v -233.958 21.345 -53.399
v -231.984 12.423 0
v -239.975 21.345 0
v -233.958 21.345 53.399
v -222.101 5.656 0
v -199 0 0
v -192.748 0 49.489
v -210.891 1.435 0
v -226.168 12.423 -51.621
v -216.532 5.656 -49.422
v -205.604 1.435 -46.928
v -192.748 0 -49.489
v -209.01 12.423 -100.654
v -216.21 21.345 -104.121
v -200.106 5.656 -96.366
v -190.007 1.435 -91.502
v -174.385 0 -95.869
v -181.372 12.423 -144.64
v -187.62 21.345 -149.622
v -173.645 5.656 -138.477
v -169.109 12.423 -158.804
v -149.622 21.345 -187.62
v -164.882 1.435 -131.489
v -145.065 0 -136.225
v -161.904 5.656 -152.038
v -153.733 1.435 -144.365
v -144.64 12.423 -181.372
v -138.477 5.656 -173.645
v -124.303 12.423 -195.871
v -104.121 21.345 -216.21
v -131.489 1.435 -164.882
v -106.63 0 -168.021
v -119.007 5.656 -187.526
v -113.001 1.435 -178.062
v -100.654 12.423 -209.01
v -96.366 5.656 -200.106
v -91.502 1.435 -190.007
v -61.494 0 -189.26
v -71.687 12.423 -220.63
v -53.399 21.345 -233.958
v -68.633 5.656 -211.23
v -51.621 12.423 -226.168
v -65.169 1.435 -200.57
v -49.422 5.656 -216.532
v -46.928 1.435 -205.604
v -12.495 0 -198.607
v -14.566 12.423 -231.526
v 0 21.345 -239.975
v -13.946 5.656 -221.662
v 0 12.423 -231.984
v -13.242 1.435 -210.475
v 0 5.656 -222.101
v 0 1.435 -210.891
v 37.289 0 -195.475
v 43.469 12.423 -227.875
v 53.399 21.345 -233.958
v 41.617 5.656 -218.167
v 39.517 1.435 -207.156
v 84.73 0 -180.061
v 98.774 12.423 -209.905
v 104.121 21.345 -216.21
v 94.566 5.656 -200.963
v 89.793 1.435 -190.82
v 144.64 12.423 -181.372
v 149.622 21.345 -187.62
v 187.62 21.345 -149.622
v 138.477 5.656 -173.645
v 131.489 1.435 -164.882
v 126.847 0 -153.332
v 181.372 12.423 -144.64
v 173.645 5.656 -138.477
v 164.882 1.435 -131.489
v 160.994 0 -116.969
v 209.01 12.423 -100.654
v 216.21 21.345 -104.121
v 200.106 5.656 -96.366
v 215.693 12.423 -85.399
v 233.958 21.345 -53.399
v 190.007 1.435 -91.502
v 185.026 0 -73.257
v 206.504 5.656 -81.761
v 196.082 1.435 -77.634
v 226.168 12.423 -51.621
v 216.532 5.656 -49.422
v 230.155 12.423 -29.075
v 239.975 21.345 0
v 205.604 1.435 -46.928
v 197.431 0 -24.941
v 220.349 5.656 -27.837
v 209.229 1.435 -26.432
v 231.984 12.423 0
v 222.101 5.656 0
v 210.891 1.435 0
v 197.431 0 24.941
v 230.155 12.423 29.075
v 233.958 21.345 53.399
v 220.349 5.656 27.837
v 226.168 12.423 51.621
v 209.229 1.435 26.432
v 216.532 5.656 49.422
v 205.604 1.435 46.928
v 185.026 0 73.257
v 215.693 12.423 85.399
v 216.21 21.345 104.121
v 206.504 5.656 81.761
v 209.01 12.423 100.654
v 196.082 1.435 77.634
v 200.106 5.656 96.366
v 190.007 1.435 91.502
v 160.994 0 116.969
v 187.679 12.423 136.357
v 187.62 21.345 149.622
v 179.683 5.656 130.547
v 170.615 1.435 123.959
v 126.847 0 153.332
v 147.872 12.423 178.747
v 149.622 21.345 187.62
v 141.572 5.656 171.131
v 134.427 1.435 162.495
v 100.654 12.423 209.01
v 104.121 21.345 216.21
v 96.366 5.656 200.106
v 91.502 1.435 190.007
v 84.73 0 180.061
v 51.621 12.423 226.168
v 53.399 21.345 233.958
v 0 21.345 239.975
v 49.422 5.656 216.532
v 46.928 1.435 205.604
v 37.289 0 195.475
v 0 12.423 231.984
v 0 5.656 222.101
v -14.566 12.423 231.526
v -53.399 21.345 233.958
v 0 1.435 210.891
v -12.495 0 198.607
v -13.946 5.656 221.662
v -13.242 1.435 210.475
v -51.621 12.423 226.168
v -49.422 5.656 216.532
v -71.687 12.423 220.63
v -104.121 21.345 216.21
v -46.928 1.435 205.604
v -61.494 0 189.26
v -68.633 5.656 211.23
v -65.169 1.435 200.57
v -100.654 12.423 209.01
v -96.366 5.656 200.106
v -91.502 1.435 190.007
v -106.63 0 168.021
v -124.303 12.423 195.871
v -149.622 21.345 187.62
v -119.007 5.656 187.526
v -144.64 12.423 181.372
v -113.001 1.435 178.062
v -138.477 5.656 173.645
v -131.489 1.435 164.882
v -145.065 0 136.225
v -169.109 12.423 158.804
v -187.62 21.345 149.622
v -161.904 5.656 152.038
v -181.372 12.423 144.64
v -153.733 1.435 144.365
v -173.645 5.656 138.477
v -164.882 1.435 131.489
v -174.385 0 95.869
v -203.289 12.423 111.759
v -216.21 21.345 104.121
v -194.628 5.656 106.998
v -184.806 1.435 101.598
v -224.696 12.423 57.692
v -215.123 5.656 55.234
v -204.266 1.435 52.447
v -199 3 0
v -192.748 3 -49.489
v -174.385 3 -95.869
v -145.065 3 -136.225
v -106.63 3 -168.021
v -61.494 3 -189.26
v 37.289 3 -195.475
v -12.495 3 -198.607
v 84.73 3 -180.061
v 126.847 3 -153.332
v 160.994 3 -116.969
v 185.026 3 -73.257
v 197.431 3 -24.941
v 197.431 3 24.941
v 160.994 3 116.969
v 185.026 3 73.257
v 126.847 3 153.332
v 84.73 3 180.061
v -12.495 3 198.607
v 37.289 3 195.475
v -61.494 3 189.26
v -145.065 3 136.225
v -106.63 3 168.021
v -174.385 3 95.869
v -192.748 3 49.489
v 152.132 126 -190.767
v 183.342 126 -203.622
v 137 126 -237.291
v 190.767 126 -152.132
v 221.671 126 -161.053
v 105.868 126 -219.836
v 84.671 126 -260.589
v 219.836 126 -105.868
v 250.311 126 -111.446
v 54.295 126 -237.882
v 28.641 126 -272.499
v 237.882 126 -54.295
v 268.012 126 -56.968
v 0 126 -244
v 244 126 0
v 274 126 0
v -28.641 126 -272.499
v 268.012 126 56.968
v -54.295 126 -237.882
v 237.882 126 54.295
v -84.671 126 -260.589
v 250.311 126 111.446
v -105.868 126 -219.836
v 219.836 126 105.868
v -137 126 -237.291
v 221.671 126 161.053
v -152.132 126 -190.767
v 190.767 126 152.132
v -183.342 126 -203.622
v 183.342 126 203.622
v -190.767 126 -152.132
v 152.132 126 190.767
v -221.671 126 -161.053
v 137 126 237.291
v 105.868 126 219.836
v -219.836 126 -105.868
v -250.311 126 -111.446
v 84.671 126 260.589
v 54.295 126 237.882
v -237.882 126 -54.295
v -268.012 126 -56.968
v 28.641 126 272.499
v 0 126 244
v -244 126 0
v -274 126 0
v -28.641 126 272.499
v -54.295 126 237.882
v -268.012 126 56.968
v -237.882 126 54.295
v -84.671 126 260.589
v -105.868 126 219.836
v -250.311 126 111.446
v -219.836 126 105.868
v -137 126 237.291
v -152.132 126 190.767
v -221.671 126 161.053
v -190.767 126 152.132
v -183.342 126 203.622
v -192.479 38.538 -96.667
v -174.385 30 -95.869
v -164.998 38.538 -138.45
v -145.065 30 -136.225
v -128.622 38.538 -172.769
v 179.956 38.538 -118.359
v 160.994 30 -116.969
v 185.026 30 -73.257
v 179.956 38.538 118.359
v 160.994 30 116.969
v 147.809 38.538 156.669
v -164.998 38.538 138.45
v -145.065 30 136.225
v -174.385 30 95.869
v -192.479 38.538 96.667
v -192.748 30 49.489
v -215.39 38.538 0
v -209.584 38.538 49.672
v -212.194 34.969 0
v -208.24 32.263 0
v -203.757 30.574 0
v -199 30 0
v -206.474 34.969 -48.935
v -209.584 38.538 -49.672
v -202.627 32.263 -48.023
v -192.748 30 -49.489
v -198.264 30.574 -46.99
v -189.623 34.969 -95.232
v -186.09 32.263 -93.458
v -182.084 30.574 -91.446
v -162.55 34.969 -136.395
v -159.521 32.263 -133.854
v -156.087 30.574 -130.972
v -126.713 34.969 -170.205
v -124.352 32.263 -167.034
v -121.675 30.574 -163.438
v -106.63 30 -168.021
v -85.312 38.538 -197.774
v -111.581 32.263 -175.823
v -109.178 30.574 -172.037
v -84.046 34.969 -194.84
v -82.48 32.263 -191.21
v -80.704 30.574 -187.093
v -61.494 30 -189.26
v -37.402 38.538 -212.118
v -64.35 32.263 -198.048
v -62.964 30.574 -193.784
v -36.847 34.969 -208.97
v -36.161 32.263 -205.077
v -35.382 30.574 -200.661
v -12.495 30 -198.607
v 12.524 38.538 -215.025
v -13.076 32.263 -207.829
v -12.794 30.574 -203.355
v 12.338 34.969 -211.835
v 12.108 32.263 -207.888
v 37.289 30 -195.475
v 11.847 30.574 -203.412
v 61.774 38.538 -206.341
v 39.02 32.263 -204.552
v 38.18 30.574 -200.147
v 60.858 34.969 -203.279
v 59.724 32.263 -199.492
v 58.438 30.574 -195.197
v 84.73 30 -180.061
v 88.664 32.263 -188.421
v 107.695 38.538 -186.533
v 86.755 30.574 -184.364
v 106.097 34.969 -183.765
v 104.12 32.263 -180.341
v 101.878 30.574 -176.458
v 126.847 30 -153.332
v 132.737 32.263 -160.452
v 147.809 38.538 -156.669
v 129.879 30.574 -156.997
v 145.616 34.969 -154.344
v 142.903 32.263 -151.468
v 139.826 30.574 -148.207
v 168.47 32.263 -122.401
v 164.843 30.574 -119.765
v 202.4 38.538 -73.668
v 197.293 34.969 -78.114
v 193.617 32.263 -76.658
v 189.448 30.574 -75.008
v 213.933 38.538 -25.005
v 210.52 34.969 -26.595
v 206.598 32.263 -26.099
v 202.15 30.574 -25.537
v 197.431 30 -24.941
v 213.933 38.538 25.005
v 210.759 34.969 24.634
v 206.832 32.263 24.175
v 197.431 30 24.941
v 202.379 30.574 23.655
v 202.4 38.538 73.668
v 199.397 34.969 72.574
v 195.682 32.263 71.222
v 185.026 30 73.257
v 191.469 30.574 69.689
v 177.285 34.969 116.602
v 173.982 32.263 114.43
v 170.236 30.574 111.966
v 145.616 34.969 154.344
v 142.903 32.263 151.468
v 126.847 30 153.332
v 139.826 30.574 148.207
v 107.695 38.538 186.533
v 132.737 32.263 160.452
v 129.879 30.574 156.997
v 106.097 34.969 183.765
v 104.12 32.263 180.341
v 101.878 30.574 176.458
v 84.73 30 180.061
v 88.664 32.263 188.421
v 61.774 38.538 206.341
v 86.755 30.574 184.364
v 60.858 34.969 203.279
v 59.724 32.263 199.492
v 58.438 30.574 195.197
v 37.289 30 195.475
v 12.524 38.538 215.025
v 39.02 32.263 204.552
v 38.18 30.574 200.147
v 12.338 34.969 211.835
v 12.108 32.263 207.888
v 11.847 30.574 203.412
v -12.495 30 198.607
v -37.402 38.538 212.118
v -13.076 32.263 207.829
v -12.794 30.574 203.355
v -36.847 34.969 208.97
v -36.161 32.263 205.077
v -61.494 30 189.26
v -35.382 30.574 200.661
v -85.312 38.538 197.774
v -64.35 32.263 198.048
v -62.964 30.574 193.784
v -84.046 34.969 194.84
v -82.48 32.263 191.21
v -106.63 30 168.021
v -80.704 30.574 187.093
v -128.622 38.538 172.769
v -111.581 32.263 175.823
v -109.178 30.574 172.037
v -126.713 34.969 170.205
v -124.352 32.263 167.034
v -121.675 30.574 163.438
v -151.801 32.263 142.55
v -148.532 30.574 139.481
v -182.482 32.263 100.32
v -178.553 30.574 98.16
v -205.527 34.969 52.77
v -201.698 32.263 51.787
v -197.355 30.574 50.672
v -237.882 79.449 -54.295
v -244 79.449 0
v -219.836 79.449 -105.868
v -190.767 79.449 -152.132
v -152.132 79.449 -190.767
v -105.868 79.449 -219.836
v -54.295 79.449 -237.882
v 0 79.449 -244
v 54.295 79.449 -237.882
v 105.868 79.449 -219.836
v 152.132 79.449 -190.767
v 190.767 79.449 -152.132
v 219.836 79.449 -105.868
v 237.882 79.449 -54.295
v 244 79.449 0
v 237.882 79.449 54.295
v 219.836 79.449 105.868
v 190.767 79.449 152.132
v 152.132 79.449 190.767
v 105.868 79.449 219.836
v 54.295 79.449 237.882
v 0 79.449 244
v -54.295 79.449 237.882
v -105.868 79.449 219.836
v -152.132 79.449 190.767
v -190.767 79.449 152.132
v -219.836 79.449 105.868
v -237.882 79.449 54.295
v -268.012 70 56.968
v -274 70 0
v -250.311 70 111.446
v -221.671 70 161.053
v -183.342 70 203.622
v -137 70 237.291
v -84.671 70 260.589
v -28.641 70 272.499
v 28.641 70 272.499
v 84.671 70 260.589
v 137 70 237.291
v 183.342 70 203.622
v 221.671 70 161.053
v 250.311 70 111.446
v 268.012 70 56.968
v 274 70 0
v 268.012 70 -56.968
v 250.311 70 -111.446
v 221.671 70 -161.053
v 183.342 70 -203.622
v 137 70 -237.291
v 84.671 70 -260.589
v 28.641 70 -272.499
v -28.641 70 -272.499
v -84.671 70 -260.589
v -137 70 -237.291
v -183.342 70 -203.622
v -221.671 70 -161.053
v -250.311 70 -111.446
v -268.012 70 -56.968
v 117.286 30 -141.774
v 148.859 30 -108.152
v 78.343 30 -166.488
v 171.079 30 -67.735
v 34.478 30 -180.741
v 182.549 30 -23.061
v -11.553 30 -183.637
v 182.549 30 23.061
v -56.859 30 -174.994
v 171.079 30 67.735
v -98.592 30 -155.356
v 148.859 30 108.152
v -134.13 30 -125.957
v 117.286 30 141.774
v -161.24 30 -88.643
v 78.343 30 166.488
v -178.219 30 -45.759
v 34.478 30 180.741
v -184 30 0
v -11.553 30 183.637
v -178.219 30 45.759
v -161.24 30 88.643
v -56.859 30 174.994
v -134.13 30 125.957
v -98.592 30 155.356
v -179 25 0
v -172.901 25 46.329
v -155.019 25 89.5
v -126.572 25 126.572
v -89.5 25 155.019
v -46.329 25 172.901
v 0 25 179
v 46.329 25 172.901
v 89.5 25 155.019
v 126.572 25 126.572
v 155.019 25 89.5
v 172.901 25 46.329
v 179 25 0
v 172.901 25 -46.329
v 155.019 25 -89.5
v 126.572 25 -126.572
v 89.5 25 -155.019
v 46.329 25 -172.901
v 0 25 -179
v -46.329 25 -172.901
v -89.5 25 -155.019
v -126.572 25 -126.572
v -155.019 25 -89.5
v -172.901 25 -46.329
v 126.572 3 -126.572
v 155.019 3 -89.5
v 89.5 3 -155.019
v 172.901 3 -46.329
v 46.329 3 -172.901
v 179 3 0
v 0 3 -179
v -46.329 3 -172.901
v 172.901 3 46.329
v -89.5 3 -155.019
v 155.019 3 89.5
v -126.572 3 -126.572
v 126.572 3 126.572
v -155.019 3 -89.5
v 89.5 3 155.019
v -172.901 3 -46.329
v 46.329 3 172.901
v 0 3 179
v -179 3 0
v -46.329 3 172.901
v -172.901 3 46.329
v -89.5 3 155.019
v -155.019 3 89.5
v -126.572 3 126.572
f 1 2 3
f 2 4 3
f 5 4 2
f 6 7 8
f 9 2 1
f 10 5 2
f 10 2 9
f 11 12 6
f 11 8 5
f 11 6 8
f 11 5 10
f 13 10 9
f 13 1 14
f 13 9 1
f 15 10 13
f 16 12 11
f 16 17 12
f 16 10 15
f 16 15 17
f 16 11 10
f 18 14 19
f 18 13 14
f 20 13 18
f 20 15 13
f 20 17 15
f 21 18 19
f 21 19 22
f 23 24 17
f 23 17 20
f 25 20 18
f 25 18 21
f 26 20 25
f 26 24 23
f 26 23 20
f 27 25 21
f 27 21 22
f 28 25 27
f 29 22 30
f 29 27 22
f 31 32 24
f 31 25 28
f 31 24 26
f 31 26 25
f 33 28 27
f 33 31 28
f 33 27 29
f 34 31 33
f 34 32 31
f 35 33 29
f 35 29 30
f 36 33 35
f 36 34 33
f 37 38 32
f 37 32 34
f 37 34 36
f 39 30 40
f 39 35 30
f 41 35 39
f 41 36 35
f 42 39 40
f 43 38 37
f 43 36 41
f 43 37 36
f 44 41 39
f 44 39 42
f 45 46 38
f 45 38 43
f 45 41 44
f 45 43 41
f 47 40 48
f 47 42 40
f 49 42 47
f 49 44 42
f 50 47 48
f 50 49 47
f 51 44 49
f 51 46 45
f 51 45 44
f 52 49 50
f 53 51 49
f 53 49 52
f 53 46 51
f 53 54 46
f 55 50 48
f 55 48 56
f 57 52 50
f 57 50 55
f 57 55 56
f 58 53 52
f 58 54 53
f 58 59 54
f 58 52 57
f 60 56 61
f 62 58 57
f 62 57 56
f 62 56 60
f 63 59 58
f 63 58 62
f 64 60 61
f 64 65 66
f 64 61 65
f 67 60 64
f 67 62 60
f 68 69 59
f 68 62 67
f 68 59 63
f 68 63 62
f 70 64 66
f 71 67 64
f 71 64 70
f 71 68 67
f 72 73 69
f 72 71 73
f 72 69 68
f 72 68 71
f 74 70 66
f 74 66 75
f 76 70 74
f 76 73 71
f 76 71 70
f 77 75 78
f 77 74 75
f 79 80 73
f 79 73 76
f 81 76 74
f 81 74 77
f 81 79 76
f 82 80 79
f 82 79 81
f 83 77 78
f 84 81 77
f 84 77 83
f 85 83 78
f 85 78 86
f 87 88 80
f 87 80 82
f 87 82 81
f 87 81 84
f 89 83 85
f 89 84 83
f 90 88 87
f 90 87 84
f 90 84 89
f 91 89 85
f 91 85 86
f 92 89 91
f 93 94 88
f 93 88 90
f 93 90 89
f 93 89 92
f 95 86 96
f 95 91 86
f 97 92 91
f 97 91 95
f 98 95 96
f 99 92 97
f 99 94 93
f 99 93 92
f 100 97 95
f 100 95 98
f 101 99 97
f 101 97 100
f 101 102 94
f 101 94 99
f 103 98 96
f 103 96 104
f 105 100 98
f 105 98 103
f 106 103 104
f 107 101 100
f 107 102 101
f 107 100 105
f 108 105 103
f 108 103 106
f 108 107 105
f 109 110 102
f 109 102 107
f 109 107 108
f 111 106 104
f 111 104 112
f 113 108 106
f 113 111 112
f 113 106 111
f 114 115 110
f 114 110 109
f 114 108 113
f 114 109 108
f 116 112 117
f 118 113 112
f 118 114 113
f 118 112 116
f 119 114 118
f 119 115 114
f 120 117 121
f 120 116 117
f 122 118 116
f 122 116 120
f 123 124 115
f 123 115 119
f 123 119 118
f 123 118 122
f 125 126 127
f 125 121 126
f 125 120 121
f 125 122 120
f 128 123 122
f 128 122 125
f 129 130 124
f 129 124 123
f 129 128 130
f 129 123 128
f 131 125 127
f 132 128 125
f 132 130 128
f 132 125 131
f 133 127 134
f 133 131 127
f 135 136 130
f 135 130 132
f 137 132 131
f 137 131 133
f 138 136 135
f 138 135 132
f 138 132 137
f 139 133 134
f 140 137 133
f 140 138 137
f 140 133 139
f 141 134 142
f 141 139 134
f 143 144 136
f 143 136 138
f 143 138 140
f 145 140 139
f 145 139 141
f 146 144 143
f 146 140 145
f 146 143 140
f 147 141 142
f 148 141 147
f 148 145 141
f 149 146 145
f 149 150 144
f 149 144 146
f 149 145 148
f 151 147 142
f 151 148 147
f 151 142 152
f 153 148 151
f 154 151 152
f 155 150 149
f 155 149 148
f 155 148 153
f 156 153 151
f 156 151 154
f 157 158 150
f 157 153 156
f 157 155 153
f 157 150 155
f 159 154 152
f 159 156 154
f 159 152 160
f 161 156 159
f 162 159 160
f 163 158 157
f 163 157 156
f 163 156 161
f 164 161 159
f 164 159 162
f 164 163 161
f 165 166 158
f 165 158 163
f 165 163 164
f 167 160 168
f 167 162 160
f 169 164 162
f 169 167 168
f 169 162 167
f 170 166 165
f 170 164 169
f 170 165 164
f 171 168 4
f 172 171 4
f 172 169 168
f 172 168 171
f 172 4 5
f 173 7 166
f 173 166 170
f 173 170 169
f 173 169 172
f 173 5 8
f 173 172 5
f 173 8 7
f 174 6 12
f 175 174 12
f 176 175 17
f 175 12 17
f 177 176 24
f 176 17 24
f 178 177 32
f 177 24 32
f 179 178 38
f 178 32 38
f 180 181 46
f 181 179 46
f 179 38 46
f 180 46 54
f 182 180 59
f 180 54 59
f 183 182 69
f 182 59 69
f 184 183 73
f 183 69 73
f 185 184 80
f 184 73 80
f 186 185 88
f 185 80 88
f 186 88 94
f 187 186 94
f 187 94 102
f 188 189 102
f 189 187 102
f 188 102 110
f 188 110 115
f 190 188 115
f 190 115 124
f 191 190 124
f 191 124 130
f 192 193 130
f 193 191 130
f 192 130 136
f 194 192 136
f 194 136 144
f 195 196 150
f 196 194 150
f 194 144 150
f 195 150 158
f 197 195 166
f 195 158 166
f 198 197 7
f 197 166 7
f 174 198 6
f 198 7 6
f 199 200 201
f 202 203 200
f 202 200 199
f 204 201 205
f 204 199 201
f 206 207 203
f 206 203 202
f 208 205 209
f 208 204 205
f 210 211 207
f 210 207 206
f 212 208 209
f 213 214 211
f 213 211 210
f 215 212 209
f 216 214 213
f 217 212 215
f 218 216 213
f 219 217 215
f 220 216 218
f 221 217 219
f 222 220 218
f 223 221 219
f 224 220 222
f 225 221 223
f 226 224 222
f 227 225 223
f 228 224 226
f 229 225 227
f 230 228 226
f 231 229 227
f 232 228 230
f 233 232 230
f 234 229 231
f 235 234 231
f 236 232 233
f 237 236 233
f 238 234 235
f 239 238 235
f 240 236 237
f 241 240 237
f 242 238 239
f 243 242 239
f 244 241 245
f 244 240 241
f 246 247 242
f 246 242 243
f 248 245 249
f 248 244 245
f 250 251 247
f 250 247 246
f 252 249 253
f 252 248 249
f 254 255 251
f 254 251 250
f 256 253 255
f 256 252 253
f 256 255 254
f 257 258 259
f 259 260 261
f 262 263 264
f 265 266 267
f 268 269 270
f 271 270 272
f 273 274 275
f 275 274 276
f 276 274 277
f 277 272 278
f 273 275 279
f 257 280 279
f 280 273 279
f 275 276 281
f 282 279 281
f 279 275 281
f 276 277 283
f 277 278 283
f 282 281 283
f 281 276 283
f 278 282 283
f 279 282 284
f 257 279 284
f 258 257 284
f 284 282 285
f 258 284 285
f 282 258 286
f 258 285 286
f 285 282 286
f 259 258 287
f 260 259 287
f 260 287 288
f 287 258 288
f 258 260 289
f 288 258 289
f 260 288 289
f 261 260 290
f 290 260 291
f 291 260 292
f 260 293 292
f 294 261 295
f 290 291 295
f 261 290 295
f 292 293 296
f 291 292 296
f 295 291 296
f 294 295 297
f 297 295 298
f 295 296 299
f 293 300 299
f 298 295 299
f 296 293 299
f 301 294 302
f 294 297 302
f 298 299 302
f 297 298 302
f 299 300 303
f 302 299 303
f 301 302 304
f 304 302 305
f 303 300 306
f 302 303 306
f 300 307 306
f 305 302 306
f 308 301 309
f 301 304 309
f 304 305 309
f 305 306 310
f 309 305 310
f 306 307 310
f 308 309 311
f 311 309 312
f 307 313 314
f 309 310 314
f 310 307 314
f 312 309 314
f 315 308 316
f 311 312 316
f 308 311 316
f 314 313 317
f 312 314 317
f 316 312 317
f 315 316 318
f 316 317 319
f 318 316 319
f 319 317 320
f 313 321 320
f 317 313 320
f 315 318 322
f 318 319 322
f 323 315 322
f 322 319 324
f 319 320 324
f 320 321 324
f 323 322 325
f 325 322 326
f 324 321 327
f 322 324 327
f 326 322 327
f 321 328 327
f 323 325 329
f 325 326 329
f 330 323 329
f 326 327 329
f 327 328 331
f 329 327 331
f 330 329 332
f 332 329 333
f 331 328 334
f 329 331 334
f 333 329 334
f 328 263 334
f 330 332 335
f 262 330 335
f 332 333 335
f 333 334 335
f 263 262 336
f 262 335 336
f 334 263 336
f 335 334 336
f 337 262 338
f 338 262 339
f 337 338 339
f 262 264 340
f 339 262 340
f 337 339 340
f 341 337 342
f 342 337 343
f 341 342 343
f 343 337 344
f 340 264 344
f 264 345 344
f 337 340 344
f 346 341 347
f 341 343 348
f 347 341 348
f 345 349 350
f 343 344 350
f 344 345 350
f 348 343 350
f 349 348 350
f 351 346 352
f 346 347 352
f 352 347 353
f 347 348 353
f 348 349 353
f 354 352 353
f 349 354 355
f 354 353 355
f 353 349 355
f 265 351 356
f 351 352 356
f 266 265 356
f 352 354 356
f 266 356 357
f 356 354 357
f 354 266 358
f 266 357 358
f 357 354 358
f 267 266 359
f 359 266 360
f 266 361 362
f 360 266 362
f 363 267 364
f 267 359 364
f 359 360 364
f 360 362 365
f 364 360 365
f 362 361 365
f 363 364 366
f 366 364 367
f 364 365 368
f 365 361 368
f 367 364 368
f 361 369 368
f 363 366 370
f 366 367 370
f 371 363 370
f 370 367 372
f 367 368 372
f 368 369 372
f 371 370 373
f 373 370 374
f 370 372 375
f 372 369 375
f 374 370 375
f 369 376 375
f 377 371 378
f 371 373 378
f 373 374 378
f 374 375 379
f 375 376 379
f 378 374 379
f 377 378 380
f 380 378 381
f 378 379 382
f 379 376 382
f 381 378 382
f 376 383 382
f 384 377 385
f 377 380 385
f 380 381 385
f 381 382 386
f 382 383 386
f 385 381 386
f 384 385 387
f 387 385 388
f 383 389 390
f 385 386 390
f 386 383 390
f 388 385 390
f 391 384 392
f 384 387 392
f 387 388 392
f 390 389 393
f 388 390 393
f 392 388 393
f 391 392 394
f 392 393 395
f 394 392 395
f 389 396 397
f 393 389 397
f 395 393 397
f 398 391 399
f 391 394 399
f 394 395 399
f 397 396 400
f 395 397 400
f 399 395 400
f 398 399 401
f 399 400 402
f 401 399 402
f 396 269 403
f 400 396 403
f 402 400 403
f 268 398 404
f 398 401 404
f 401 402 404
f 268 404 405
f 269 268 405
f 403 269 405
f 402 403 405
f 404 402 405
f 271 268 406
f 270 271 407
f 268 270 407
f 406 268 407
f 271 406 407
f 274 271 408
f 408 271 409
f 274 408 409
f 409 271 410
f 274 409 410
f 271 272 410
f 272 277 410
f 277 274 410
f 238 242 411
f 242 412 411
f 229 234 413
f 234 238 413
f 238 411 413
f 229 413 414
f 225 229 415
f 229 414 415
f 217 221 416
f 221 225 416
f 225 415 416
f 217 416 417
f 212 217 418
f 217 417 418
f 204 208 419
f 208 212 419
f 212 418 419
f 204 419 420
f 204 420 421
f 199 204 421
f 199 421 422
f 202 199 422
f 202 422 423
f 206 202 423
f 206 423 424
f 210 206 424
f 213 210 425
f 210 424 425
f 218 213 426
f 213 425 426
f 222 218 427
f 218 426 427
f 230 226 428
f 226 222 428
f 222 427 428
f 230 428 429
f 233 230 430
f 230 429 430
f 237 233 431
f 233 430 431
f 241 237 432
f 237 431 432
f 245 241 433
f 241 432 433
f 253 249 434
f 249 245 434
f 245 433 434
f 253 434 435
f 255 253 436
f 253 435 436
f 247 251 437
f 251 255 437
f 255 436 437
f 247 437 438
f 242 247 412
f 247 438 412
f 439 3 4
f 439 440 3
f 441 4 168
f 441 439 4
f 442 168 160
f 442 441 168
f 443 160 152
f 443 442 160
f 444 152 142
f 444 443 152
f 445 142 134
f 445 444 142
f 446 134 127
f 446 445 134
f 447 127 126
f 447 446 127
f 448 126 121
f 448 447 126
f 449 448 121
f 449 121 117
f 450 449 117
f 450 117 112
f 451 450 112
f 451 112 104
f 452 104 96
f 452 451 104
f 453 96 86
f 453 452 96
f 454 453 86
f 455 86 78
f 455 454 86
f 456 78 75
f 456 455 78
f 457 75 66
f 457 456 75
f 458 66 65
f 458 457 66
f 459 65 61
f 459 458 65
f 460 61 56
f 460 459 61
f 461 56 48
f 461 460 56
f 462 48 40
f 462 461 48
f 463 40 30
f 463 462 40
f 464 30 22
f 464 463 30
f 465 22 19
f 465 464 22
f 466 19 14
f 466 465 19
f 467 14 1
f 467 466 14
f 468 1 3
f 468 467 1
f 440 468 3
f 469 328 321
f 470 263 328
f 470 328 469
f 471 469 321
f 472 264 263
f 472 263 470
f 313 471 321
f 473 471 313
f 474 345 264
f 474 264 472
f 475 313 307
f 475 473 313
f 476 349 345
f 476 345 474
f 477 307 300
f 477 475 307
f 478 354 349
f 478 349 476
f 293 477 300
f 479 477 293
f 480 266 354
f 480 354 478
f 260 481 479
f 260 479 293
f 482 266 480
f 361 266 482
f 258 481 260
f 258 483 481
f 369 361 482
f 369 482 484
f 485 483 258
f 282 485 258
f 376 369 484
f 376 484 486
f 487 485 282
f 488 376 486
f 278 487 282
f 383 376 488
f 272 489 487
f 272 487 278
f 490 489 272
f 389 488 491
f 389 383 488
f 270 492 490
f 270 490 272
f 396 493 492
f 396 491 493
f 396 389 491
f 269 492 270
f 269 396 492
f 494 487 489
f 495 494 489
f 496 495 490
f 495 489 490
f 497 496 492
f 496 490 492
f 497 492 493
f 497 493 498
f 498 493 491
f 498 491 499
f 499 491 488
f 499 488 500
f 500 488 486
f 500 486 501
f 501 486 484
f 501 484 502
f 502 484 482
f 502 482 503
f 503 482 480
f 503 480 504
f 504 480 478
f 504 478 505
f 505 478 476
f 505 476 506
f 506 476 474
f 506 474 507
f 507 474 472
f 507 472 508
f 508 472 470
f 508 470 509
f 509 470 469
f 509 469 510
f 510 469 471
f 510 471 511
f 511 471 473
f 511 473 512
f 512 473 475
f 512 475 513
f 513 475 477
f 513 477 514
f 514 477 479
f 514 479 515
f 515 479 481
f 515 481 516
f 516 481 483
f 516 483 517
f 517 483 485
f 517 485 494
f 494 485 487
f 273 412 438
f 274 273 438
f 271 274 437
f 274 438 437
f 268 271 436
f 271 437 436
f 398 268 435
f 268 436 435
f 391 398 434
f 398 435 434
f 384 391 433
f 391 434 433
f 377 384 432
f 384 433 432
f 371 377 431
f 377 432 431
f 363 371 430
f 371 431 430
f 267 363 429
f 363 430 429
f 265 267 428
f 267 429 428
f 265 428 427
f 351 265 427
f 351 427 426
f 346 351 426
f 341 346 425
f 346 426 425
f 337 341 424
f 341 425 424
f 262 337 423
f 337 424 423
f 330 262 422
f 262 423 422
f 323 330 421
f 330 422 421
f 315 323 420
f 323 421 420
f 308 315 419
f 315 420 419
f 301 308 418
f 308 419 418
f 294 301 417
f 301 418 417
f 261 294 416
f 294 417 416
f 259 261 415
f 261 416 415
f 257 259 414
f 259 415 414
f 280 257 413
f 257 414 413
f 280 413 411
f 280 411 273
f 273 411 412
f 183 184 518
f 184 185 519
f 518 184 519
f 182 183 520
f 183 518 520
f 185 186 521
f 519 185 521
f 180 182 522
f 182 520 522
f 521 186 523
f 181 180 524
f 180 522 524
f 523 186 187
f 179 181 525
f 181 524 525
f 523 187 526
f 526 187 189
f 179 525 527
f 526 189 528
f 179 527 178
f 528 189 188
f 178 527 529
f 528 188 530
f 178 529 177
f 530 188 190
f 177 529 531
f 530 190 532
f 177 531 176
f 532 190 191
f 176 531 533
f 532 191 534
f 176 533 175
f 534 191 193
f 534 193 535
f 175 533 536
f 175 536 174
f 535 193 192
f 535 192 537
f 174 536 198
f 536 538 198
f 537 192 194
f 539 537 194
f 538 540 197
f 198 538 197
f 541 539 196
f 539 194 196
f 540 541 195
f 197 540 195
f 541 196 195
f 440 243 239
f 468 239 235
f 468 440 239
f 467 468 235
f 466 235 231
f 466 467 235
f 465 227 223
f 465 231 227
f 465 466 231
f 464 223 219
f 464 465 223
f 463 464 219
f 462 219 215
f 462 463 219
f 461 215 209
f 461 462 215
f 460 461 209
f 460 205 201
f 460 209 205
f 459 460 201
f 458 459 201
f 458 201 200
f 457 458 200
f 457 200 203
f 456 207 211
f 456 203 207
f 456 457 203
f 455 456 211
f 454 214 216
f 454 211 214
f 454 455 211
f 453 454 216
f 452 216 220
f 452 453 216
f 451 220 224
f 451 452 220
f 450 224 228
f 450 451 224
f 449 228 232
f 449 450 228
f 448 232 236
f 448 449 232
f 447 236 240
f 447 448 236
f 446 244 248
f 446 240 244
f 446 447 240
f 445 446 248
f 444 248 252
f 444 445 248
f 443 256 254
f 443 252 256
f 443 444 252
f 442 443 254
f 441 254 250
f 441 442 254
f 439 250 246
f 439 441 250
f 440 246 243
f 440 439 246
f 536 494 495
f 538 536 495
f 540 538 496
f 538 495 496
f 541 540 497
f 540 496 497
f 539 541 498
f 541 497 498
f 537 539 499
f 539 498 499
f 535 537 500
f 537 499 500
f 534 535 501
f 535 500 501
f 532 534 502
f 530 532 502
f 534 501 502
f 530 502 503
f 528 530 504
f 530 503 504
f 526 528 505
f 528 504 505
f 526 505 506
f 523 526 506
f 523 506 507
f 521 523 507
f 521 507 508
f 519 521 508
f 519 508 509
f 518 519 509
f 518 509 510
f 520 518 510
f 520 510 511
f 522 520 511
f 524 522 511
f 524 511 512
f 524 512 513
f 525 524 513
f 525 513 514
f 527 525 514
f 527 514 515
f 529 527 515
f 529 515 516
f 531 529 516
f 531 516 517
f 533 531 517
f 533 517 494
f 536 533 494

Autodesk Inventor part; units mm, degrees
ref_plane "YZ Plane" through (0, 0, 0) normal (1, 0, 0) x (0, 1, 0)
ref_plane "XZ Plane" through (0, 0, 0) normal (0, 1, 0) x (-1, 0, 0)
ref_plane "XY Plane" through (0, 0, 0) normal (0, 0, 1) x (1, 0, 0)
sketch "Sketch1" plane through (0, 0, 0) normal (0, 0, 1) x (1, 0, 0)
  line L0 (-179, 3) -> (-179, 30)
  line L1 (-179, 30) -> (-199, 30)
  line L2 (-274, 126) -> (-244, 126)
  line L3 (-274, 126) -> (-274, 70)
  arc A0 (-239.9746, 21.3454) -> (-199, 0) centre (-199, 50) ccw
  line L4 (-274, 70) -> (-239.9746, 21.3454)
  line L5 (0, 0) -> (-199, 0) construction
  line L6 (-244, 126) -> (-244, 79.4492)
  line L7 (-244, 79.4492) -> (-215.3898, 38.5382)
  arc A1 (-215.3898, 38.5382) -> (-199, 30) centre (-199, 50) ccw
  line L8 (-179, 3) -> (-199, 3)
  line L9 (-199, 3) -> (-199, 0)
  line L10 (0, -31.2197) -> (0, 152.2033) construction
  line L11 (-239.9746, 21.3454) -> (-215.3898, 38.5382) construction
  dimension "d3" = 50
  dimension "d4" = 123
  dimension "d5" = 65
  dimension "d6" = 30
  dimension "d11" = 30
  dimension "d22" = 199
  dimension "d23" = 20
  dimension "d32" = 3
  dimension "d42" = 27
  dimension "d44" = 70
revolve "Revolution1" add sketch "Sketch1" angle 360 about axis through (0, -10, 0) along (0, 1, 0)
chamfer "Chamfer1" distance 5 angle 45 1 edges at (179, 30, 0)
properties material "Polyethylene, Low Density"
